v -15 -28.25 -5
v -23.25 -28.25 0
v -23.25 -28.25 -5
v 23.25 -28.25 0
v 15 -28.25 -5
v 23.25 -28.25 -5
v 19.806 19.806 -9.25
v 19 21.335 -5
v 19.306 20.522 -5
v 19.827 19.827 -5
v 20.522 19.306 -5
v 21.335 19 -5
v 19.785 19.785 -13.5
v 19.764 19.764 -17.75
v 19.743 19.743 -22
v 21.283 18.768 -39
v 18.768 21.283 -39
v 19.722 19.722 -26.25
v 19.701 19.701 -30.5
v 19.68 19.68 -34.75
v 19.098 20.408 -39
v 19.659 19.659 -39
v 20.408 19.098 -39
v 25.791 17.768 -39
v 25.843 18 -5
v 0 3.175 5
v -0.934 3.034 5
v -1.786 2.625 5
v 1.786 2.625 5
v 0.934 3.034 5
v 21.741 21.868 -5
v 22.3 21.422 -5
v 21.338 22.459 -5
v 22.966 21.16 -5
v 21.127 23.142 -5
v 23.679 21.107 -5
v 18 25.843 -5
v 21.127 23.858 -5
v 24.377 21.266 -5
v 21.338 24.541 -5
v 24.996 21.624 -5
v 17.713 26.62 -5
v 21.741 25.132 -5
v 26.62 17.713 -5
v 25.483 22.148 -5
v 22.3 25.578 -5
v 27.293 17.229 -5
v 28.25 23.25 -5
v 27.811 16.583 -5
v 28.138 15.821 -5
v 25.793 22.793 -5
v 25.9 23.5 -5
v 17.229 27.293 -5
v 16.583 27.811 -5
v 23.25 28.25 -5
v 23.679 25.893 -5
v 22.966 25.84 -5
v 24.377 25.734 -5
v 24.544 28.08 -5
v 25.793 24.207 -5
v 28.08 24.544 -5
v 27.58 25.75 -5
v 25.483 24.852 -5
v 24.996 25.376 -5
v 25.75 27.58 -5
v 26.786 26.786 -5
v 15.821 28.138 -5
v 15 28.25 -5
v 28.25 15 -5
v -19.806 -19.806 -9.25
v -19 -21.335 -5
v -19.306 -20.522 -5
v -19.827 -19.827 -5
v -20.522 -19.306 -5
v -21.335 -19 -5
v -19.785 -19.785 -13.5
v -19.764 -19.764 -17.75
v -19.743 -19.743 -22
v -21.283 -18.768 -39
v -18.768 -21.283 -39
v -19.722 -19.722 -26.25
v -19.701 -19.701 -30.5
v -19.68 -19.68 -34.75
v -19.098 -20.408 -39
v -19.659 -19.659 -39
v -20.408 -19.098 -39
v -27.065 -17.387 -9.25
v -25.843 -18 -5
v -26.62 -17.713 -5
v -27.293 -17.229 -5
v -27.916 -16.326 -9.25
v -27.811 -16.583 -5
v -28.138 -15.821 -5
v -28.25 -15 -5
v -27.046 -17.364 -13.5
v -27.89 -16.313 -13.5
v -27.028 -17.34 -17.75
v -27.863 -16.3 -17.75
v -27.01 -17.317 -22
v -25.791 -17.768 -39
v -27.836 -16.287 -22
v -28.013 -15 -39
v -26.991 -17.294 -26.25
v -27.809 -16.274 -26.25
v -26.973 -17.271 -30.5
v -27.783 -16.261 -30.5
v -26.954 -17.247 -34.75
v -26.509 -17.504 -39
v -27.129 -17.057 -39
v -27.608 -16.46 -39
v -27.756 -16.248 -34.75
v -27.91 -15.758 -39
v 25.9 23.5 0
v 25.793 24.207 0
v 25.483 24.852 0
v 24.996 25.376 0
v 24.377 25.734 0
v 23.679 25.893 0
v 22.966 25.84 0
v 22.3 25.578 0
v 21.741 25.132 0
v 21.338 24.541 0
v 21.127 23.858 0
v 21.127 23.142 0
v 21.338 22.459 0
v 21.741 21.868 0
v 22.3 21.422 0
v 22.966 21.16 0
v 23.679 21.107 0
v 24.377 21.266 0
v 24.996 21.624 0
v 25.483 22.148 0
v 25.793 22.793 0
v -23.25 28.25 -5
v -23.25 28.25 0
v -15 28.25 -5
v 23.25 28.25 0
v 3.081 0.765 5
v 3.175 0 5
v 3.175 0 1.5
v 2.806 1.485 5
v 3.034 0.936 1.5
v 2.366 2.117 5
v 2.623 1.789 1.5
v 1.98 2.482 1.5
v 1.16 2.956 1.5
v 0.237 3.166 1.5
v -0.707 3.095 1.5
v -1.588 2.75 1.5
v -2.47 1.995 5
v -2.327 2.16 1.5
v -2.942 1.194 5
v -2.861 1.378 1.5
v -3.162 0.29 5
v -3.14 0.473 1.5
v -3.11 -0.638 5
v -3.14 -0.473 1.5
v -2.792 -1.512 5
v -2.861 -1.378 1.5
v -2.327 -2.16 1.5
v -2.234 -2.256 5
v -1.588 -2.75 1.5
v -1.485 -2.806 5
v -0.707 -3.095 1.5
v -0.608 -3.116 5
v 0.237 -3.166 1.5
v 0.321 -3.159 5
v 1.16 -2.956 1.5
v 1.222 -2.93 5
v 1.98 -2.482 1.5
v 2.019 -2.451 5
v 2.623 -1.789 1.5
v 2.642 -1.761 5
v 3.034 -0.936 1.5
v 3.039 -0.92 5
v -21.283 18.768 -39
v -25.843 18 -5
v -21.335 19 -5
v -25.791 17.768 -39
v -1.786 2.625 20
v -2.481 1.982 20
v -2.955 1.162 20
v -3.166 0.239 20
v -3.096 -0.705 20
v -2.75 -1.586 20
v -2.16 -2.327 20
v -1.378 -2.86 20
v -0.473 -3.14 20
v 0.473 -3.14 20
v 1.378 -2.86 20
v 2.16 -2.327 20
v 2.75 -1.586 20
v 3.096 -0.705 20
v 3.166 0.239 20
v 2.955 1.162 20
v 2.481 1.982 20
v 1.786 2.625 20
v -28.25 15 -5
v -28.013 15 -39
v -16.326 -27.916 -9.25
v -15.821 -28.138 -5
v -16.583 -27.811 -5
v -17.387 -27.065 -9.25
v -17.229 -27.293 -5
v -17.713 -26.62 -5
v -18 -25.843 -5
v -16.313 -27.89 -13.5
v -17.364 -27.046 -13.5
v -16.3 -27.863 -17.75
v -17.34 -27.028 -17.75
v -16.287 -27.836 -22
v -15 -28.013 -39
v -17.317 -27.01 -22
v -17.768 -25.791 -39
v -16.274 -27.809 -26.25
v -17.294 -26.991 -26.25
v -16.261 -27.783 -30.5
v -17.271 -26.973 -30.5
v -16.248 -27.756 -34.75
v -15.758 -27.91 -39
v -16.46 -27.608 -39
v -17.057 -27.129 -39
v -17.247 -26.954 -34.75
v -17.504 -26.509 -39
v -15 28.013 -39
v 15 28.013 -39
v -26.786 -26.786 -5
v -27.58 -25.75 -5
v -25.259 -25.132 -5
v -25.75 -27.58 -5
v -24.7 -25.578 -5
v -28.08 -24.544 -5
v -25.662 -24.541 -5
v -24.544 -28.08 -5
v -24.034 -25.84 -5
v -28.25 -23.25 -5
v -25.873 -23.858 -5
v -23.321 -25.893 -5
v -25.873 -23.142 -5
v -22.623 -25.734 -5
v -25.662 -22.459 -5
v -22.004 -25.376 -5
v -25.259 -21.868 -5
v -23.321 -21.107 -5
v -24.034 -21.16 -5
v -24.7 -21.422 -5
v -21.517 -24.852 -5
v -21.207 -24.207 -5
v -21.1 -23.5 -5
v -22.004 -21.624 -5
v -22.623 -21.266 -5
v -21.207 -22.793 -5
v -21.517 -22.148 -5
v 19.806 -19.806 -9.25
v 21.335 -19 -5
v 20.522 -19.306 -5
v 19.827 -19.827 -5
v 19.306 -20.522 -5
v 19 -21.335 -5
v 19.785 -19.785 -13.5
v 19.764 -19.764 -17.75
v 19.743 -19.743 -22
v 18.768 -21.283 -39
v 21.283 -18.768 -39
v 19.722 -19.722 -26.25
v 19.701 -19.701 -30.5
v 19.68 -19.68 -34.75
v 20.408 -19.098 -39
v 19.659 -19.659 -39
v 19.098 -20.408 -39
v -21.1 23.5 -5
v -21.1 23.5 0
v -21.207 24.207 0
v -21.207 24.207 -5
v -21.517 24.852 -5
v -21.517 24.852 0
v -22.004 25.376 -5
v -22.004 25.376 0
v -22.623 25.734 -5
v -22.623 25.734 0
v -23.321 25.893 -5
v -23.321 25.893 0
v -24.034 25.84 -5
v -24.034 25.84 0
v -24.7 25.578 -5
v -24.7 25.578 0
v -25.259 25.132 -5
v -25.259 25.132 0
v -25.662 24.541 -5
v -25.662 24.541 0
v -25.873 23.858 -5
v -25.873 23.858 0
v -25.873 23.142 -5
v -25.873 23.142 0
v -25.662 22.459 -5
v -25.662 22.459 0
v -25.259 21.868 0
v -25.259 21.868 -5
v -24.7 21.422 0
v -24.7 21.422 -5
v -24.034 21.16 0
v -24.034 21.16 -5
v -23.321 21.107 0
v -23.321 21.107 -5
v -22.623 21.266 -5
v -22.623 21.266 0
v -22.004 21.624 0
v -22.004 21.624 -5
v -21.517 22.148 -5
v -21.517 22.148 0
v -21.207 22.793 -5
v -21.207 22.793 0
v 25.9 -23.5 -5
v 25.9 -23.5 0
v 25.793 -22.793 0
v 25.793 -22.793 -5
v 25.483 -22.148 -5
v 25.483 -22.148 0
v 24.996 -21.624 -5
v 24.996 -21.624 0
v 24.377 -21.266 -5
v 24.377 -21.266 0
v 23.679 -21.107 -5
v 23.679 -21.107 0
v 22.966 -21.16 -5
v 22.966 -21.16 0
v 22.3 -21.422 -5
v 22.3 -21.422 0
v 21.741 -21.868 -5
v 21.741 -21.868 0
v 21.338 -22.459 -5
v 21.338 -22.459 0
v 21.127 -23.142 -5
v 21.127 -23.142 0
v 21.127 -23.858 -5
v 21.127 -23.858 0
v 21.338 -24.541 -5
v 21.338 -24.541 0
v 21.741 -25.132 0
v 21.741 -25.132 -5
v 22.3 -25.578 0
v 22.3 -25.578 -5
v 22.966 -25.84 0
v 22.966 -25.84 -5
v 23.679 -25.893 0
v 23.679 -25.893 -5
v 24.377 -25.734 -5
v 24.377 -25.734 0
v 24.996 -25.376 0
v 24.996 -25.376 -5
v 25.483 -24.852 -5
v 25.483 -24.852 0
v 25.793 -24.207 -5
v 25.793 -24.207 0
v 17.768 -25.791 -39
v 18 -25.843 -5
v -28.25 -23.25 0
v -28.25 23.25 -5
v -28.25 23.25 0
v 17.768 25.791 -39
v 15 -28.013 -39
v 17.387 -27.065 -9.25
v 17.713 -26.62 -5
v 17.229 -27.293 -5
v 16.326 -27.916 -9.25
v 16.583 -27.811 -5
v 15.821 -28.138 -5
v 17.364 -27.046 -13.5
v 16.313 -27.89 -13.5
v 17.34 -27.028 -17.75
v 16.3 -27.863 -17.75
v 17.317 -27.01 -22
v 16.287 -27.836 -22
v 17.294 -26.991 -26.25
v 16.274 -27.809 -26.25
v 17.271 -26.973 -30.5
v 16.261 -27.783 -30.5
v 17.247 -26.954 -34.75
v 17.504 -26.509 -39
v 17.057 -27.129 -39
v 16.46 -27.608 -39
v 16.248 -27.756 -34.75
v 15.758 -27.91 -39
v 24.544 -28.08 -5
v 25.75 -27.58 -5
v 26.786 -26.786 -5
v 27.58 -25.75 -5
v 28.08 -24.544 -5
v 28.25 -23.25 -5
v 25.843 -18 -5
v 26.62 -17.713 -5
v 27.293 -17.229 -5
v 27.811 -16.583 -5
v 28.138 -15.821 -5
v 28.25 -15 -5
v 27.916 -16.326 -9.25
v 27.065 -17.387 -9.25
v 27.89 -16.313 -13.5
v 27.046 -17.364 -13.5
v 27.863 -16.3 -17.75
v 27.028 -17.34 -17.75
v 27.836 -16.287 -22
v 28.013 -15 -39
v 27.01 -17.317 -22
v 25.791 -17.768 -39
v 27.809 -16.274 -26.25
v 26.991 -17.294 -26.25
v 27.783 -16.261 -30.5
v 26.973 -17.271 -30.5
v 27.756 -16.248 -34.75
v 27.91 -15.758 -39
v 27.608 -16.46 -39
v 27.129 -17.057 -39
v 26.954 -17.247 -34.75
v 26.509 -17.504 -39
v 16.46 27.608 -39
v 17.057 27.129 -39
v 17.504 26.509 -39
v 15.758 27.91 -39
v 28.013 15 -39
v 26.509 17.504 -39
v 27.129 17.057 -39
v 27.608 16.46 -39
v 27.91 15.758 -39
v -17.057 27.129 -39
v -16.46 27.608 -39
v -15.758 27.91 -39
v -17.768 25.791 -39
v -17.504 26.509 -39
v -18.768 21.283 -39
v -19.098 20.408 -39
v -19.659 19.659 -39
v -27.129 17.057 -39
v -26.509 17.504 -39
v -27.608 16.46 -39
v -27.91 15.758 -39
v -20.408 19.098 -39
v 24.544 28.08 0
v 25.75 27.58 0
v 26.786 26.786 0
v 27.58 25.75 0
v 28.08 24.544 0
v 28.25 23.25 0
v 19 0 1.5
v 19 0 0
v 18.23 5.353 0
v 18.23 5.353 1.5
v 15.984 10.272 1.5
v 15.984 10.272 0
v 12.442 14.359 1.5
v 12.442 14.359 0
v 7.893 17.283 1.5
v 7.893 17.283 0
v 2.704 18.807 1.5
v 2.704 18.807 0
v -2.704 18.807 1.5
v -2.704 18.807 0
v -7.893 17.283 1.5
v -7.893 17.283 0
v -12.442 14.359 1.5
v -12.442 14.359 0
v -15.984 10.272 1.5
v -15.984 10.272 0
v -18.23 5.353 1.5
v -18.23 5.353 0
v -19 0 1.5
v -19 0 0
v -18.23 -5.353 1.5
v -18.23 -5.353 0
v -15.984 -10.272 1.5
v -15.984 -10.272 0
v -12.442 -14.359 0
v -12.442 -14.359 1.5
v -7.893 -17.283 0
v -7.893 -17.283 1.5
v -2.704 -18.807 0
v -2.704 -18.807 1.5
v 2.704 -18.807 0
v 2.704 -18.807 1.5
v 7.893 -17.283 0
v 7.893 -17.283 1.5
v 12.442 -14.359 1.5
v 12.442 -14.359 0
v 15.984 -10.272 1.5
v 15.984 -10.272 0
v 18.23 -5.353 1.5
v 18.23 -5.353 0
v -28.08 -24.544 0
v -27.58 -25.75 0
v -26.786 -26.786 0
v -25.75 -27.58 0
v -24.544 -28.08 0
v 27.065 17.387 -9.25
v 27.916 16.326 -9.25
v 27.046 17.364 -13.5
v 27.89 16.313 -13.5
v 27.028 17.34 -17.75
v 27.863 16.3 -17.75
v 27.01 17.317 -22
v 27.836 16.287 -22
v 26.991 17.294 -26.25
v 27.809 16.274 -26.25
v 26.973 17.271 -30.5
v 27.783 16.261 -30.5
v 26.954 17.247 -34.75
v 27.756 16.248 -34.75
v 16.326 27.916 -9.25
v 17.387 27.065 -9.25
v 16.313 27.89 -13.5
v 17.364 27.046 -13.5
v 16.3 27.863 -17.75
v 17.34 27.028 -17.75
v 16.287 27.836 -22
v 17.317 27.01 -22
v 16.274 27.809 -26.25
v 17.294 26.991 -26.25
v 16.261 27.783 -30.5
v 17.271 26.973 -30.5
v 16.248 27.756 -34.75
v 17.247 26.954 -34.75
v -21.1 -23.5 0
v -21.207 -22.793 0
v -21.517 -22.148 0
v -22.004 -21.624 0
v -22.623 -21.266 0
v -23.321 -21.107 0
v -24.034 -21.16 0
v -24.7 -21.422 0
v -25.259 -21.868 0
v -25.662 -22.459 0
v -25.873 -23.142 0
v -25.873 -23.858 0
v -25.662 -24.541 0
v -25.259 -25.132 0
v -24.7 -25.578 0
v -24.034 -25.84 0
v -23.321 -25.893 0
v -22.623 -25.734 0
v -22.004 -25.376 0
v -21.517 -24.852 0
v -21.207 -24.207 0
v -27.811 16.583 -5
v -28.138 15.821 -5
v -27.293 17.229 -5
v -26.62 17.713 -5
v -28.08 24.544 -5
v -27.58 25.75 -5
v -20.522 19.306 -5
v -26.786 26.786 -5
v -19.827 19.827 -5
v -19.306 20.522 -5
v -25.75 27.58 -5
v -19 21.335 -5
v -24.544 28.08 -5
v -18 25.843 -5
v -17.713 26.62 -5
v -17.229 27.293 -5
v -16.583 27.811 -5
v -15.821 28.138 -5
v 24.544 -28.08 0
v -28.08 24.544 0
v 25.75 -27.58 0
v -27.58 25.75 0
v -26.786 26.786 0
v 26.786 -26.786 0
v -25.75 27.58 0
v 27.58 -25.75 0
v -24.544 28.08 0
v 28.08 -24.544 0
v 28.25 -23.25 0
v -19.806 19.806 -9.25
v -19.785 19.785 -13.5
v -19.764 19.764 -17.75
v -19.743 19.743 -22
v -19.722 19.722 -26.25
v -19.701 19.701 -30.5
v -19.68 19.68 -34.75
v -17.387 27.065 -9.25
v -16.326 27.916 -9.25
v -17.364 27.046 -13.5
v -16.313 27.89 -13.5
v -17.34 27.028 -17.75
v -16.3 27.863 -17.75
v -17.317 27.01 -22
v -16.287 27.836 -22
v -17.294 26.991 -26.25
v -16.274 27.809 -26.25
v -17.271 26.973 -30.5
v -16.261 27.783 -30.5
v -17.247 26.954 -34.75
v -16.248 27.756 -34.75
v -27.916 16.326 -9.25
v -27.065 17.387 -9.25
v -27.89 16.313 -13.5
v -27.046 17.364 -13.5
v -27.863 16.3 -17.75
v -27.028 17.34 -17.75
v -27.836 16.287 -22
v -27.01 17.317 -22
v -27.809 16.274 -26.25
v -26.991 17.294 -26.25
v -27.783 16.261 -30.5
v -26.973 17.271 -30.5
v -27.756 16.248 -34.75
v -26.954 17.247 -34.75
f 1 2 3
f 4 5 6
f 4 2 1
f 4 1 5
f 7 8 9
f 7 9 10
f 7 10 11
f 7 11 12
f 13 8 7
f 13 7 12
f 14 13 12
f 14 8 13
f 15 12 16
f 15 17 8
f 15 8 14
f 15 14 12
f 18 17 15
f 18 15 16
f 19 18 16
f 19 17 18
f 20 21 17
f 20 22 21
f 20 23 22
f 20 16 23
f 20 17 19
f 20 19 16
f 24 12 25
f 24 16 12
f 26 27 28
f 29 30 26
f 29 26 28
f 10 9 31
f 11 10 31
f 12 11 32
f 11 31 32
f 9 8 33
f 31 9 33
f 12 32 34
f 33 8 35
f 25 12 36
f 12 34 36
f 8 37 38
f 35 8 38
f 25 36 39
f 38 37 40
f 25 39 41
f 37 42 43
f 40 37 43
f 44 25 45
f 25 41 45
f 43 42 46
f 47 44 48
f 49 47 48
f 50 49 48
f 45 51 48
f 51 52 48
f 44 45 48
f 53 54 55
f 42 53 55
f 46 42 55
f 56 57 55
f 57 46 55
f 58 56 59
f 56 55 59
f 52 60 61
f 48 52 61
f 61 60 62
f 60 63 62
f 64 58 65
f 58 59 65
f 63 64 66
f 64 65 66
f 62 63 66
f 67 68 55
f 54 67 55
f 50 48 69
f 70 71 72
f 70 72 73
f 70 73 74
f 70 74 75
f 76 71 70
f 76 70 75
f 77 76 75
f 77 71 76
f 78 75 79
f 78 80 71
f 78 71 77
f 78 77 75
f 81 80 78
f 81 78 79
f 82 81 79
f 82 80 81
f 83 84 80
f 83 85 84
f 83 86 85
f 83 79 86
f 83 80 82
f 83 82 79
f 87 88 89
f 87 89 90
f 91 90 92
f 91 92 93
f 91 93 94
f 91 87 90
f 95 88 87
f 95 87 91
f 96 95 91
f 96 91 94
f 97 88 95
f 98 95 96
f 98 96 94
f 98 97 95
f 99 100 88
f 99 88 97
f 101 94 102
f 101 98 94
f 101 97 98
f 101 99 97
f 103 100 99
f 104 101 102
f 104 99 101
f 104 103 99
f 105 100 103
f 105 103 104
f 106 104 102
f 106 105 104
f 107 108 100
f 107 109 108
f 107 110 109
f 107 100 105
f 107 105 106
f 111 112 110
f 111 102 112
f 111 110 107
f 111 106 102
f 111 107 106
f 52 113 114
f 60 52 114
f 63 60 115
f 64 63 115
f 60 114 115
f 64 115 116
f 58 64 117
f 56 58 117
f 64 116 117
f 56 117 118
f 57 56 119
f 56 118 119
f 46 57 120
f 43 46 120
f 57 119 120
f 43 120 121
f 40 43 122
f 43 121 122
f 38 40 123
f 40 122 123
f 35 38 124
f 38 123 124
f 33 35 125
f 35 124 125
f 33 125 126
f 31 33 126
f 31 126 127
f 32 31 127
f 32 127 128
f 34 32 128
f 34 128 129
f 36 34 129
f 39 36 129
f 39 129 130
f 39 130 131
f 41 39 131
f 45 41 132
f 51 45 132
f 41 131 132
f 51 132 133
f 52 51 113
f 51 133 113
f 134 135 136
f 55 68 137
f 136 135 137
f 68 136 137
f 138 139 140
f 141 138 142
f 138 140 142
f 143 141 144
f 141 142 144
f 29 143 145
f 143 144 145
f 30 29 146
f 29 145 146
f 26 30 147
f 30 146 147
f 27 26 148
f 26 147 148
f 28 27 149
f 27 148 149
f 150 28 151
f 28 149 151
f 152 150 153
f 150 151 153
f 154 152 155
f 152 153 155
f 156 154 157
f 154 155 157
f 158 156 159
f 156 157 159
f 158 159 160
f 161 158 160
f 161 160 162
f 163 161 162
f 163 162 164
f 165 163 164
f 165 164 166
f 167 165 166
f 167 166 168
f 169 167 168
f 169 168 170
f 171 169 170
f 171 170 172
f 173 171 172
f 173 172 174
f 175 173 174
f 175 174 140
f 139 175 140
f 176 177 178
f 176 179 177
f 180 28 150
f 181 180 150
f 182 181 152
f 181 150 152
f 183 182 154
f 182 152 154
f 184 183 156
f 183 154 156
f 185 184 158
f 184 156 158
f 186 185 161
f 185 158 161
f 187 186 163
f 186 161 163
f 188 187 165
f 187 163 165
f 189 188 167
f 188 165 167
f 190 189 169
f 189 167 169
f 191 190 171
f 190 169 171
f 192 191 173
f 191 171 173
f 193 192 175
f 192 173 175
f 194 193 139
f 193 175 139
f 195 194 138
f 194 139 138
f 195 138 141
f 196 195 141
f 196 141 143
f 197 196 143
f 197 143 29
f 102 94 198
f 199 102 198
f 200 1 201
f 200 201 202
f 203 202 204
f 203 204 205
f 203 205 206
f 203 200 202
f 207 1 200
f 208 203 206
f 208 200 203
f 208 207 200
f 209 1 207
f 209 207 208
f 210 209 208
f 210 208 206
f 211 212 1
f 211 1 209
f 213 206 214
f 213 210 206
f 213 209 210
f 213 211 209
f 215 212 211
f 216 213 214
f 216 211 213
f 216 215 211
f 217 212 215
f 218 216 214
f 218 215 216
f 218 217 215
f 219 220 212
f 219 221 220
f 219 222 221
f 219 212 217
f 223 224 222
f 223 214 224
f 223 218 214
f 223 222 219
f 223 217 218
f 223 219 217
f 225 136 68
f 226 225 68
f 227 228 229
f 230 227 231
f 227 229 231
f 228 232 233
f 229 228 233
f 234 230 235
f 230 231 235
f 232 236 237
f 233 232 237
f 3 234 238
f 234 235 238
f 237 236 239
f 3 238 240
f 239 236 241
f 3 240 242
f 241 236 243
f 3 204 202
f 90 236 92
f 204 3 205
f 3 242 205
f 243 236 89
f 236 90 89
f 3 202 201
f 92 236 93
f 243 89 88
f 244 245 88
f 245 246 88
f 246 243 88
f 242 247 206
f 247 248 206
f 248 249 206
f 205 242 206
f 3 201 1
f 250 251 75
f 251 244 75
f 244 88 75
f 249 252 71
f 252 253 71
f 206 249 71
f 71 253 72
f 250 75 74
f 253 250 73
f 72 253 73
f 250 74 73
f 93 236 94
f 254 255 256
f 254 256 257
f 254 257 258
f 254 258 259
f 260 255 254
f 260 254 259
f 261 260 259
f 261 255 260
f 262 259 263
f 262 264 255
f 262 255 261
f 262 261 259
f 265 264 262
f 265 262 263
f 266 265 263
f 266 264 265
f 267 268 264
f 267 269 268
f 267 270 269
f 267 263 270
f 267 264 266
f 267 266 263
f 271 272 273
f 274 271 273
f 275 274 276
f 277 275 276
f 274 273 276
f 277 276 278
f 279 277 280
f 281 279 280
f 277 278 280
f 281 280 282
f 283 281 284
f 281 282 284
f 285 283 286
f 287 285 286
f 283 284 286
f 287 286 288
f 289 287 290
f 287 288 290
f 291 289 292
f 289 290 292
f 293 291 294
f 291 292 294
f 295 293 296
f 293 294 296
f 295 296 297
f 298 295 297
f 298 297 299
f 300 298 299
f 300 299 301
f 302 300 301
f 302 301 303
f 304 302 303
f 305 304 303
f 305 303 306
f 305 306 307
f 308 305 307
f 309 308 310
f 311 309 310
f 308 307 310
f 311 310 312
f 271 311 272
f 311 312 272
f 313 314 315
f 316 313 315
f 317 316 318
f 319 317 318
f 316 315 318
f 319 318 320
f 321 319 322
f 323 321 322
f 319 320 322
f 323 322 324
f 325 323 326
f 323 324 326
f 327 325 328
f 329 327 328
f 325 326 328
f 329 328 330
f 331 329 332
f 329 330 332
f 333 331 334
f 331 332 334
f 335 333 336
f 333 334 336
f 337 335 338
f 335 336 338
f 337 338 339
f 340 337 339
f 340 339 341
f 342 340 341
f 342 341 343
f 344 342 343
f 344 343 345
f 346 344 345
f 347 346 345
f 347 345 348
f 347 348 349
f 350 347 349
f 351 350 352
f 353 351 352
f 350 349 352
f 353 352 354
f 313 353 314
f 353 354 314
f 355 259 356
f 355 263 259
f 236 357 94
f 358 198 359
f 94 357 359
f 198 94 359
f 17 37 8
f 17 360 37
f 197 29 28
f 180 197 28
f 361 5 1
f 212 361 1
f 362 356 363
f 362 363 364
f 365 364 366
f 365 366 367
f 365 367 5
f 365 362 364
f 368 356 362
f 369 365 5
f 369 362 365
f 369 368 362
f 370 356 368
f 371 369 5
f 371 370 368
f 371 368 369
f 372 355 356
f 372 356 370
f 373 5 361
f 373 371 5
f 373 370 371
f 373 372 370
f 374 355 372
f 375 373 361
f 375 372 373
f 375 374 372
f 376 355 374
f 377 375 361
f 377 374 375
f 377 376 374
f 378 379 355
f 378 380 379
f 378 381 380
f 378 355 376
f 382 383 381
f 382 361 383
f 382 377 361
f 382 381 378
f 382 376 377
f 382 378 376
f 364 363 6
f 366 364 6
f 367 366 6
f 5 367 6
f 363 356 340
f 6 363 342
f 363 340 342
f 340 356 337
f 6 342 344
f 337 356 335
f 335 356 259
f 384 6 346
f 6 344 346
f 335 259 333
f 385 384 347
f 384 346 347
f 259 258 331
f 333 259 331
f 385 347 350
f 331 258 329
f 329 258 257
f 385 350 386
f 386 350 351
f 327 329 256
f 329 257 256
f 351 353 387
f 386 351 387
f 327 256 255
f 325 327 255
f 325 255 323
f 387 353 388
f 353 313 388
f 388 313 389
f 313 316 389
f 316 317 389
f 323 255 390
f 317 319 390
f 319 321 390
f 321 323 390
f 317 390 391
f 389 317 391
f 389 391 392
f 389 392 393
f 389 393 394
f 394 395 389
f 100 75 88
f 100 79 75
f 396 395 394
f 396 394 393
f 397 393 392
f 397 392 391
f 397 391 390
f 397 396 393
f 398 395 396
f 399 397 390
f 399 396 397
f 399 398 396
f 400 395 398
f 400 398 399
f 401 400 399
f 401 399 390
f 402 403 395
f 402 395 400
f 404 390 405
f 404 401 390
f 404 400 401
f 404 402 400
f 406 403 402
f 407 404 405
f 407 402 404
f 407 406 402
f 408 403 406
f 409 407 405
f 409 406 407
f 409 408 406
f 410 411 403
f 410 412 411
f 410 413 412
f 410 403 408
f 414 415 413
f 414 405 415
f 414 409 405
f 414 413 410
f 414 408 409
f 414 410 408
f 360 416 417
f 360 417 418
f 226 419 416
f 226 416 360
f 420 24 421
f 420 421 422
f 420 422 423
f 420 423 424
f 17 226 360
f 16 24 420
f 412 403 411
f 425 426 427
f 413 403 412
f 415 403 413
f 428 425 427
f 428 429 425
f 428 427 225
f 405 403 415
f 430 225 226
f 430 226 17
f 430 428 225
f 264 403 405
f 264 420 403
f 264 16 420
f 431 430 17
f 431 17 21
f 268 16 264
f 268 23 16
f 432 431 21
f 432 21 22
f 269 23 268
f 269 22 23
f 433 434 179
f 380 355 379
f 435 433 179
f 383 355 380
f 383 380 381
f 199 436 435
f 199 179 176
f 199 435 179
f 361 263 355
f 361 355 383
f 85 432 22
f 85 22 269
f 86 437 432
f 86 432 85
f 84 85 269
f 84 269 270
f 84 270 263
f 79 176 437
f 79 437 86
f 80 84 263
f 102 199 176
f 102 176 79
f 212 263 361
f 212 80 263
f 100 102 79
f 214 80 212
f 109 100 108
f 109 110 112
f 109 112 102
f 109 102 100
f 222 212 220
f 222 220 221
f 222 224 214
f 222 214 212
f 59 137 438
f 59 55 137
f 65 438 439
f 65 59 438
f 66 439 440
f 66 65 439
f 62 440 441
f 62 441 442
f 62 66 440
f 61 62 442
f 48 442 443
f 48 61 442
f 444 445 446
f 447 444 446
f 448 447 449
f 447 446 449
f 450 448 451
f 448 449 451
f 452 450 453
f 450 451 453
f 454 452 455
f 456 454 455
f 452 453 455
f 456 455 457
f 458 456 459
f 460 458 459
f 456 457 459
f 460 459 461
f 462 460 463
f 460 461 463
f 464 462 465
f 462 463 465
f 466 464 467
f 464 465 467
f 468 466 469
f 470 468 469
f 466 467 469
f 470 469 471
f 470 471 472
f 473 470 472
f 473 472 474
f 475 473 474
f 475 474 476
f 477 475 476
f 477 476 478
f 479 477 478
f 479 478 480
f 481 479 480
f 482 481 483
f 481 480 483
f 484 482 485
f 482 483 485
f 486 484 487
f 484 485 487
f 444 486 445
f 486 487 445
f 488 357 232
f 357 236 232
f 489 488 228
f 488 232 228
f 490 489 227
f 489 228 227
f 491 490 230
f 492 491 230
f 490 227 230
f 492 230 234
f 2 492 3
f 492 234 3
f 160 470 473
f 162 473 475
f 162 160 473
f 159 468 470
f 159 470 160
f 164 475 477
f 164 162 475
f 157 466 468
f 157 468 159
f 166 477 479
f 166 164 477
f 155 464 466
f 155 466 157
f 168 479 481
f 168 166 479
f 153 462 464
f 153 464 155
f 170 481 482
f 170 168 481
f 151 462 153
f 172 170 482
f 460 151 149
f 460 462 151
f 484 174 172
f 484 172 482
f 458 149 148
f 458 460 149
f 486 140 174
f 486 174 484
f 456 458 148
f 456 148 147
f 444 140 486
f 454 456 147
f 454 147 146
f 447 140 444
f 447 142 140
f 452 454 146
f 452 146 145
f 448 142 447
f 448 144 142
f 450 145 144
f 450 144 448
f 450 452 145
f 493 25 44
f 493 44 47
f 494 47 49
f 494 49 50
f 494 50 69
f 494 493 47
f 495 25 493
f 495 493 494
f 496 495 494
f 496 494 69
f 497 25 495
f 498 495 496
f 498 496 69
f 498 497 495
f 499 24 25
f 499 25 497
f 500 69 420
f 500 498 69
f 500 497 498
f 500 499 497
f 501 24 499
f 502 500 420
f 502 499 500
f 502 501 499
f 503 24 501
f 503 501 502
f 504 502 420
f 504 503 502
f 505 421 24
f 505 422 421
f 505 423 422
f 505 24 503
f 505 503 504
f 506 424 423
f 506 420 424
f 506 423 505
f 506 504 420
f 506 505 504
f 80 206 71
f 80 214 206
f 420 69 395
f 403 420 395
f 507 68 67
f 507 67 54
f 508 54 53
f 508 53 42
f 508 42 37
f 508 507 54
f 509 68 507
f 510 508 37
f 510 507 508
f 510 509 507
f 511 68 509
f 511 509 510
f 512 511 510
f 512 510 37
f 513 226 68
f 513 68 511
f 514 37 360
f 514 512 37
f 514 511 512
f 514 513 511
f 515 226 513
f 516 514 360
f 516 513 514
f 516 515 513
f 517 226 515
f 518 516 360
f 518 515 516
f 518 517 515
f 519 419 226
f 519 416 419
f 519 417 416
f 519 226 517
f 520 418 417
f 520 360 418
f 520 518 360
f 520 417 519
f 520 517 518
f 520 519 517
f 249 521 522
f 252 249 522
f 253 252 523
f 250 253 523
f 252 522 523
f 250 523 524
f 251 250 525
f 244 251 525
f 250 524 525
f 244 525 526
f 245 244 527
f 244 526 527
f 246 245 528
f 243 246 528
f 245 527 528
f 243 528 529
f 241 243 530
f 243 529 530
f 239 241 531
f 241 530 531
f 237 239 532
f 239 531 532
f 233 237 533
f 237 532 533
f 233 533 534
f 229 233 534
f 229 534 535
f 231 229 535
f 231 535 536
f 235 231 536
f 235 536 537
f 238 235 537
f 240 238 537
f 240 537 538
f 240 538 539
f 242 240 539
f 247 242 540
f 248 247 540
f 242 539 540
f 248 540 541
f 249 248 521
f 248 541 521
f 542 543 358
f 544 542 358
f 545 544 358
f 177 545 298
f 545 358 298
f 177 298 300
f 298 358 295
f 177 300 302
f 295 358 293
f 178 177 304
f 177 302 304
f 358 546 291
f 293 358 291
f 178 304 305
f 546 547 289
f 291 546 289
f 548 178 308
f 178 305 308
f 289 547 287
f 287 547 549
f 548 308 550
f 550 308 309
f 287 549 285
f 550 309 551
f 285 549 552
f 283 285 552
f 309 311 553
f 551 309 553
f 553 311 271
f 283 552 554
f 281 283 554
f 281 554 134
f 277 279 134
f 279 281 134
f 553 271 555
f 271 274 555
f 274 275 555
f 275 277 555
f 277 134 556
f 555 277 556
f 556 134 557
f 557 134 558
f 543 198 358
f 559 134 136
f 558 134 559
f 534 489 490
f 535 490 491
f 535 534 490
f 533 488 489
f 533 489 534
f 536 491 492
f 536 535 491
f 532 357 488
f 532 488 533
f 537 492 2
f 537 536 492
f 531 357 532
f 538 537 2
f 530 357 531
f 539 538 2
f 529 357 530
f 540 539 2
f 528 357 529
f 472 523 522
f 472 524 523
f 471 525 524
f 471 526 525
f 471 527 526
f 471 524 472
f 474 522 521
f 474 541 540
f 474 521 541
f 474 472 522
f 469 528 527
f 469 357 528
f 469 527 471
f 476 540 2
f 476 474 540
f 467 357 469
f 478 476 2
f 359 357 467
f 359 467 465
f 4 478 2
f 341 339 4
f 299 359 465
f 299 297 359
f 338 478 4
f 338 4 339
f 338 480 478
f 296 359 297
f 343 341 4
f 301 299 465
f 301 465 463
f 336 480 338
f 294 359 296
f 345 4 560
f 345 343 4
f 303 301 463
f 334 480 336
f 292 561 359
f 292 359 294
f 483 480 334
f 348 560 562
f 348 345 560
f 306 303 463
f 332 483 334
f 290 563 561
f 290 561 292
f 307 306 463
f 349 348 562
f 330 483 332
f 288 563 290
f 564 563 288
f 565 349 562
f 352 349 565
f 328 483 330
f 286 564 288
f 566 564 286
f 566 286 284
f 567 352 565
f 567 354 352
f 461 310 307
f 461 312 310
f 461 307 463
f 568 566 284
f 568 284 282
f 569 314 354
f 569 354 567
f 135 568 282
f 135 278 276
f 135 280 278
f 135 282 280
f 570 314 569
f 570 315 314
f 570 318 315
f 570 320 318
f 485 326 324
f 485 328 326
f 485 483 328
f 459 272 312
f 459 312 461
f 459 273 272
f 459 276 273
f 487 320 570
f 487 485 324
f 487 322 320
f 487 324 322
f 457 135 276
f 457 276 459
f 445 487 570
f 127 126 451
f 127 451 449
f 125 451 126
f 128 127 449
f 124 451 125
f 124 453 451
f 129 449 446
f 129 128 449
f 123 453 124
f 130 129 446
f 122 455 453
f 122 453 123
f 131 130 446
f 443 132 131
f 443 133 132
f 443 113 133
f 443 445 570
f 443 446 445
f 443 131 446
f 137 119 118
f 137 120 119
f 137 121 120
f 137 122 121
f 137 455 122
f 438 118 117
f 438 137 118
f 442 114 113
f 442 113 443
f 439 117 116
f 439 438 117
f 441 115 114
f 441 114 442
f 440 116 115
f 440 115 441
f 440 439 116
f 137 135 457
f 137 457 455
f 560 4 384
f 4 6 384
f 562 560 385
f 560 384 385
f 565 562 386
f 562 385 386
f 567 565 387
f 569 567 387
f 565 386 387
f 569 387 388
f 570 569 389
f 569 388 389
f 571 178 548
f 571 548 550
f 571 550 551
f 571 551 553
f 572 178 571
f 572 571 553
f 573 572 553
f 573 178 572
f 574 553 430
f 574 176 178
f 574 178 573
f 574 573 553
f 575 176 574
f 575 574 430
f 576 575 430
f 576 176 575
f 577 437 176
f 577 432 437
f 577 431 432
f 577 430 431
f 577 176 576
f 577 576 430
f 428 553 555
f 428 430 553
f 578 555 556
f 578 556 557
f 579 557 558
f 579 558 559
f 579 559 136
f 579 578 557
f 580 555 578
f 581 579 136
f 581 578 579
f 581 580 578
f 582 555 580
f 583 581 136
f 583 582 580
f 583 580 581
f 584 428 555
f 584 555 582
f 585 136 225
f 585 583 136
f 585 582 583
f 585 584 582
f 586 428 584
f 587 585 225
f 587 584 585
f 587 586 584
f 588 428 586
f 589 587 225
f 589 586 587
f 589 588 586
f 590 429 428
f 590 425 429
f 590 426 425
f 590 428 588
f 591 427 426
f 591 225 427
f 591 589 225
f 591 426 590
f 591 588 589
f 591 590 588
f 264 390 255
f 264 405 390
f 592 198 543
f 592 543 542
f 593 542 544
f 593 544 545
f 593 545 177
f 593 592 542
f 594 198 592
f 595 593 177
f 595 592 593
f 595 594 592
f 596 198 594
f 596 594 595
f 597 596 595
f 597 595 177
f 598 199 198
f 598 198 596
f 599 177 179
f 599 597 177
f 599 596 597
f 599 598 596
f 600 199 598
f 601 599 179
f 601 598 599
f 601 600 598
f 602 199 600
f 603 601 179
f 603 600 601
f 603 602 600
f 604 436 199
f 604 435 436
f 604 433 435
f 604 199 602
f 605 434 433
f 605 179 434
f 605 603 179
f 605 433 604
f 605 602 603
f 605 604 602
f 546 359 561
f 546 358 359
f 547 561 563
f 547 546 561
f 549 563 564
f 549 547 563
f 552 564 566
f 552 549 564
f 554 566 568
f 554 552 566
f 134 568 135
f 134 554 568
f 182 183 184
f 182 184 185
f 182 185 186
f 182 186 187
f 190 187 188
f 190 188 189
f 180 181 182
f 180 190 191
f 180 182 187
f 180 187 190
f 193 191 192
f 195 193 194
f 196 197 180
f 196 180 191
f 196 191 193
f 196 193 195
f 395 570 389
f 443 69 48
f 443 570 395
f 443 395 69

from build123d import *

# Parameters (mm, degrees)
F0_W      = 56.5
F0_H      = 56.5
F1_DEPTH  = 5
F3_DEPTH  = 34
F3_TAPER  = 0.4
F4_R      = 2.4
F5_DEPTH  = 5
F6_R      = 5
F7_R      = 19
F8_DEPTH  = 1.5
F9_R      = 3.175
F10_DEPTH = 3.5
F12_DEPTH = 15


with BuildPart() as f1:
    # F0 (on Top) → F1 (new body)
    with BuildSketch(Plane.XY):
        Rectangle(F0_W, F0_H)
    extrude(amount=-F1_DEPTH)

    # F2 (on face) → F3 (join)
    with BuildSketch(Plane(origin=(0, 0, -5), x_dir=(1, 0, 0), z_dir=(0, 0, -1))):
        with BuildLine():
            Line((15, 28.25), (0, 28.25))
            Line((0, 28.25), (-15, 28.25))
            ThreePointArc((-15, 28.25), (-16.9232649975, 27.5737223332), (-18, 25.842554673))
            Line((-18, 25.842554673), (-19, 21.3345213365))
            ThreePointArc((-19, 21.3345213365), (-19.8271146082, 19.8271146082), (-21.3345213365, 19))
            Line((-21.3345213365, 19), (-25.842554673, 18))
            ThreePointArc((-25.842554673, 18), (-27.5737223332, 16.9232649975), (-28.25, 15))
            Line((-28.25, 15), (-28.25, 0))
            Line((-28.25, 0), (-28.25, -15))
            ThreePointArc((-28.25, -15), (-27.5737223332, -16.9232649975), (-25.842554673, -18))
            Line((-25.842554673, -18), (-21.3345213365, -19))
            ThreePointArc((-21.3345213365, -19), (-19.8271146082, -19.8271146082), (-19, -21.3345213365))
            Line((-19, -21.3345213365), (-18, -25.842554673))
            ThreePointArc((-18, -25.842554673), (-16.9232649975, -27.5737223332), (-15, -28.25))
            Line((-15, -28.25), (0, -28.25))
            Line((0, -28.25), (15, -28.25))
            ThreePointArc((15, -28.25), (16.9232649975, -27.5737223332), (18, -25.842554673))
            Line((18, -25.842554673), (19, -21.3345213365))
            ThreePointArc((19, -21.3345213365), (19.8271146082, -19.8271146082), (21.3345213365, -19))
            Line((21.3345213365, -19), (25.842554673, -18))
            ThreePointArc((25.842554673, -18), (27.5737223332, -16.9232649975), (28.25, -15))
            Line((28.25, -15), (28.25, 0))
            Line((28.25, 0), (28.25, 15))
            ThreePointArc((28.25, 15), (27.5737223332, 16.9232649975), (25.842554673, 18))
            Line((25.842554673, 18), (21.3345213365, 19))
            ThreePointArc((21.3345213365, 19), (19.8271146082, 19.8271146082), (19, 21.3345213365))
            Line((19, 21.3345213365), (18, 25.842554673))
            ThreePointArc((18, 25.842554673), (16.9232649975, 27.5737223332), (15, 28.25))
        make_face()
    extrude(amount=F3_DEPTH, taper=F3_TAPER)

    # F4 (on face) → F5 (cut, through all)
    with BuildSketch(Plane.XY):
        with Locations((-23.5, 23.5)):
            Circle(F4_R)
        with Locations((23.5, 23.5)):
            Circle(F4_R)
        with Locations((-23.5, -23.5)):
            Circle(F4_R)
        with Locations((23.5, -23.5)):
            Circle(F4_R)
    extrude(amount=-F5_DEPTH, mode=Mode.SUBTRACT)

    # F6
    f6_edges = [f1.edges().sort_by_distance(p)[0] for p in [
        (28.25, 28.25, -2.5),
        (-28.25, 28.25, -2.5),
        (-28.25, -28.25, -2.5),
        (28.25, -28.25, -2.5),
    ]]
    fillet(f6_edges, radius=F6_R)

    # F7 (on face) → F8 (join)
    with BuildSketch(Plane.XY):
        Circle(F7_R)
    extrude(amount=F8_DEPTH)

    # F9 (on face) → F10 (join)
    with BuildSketch(Plane.XY.offset(1.5)):
        Circle(F9_R)
    extrude(amount=F10_DEPTH)

    # F11 (on face) → F12 (join)
    with BuildSketch(Plane.XY.offset(5)):
        with BuildLine():
            Line((1.7860571099, 2.625), (-1.7860571099, 2.625))
            ThreePointArc((-1.7860571099, 2.625), (0, -3.175), (1.7860571099, 2.625))
        make_face()
    extrude(amount=F12_DEPTH)


solid = f1.part
